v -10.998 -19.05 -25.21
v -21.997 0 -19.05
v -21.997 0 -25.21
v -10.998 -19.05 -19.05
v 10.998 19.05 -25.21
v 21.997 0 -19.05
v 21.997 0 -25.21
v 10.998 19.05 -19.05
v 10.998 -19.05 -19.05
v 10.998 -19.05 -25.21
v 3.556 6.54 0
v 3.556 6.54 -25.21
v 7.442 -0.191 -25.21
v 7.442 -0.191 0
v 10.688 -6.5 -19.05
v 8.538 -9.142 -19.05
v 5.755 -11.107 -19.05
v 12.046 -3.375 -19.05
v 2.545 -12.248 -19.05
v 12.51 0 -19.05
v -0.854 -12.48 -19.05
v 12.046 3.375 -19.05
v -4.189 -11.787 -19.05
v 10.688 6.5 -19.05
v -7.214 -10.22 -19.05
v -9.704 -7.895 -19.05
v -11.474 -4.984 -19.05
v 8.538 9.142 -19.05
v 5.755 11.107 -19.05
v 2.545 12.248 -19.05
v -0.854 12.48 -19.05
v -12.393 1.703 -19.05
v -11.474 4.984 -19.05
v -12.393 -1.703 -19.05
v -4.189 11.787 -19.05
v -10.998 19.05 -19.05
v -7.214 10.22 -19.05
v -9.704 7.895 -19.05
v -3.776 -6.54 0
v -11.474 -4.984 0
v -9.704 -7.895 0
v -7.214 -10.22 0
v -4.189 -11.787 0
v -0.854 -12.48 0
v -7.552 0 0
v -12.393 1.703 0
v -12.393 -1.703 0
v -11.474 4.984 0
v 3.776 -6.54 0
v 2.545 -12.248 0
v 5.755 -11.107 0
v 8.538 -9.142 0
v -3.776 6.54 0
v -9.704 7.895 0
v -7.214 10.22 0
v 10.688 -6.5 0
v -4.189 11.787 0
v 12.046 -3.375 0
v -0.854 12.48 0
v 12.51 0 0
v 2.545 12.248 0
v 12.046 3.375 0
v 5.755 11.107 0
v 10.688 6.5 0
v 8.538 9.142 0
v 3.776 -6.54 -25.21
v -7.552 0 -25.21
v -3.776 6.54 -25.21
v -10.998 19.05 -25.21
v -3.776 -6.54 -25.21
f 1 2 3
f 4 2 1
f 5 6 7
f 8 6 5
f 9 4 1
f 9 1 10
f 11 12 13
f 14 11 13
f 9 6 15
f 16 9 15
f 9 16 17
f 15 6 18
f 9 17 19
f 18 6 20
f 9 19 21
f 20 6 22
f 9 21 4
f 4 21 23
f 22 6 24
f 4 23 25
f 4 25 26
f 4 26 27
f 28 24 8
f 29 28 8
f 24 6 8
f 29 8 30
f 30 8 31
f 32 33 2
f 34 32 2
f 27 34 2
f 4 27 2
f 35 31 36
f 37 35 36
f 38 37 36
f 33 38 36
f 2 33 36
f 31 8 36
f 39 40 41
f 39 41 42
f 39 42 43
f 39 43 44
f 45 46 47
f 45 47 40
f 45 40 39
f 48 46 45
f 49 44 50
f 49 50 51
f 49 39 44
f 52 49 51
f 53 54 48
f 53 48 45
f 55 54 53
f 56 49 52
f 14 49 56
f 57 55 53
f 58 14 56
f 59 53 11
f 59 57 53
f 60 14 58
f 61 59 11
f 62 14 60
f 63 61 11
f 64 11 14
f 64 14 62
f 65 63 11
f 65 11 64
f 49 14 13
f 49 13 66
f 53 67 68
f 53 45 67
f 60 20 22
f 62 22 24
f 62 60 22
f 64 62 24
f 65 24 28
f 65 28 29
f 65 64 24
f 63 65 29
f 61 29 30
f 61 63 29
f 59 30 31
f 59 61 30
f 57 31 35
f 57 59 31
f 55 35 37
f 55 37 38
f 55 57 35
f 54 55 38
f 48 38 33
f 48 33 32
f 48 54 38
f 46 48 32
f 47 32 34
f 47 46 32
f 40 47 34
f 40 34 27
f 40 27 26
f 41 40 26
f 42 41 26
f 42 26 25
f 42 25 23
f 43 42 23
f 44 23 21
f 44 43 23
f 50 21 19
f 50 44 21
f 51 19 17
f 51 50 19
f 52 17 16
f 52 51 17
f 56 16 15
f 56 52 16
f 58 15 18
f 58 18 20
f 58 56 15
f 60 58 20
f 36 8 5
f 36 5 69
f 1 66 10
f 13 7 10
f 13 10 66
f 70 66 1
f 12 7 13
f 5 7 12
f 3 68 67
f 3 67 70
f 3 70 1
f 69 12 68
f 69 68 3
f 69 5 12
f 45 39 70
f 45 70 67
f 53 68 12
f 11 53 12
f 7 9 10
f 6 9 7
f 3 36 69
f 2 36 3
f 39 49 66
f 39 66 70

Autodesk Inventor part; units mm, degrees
ref_plane "YZ Plane" through (0, 0, 0) normal (1, 0, 0) x (0, 1, 0)
ref_plane "XZ Plane" through (0, 0, 0) normal (0, 1, 0) x (-1, 0, 0)
ref_plane "XY Plane" through (0, 0, 0) normal (0, 0, 1) x (1, 0, 0)
sketch "Sketch1" plane through (0, 0, 0) normal (0, 0, 1) x (1, 0, 0)
  line L0 (3.6662, 6.35) -> (7.3323, 0)
  line L1 (7.3323, 0) -> (3.6662, -6.35)
  line L2 (3.6662, -6.35) -> (-3.6662, -6.35)
  line L3 (-3.6662, -6.35) -> (-7.3323, 0)
  line L4 (-7.3323, 0) -> (-3.6662, 6.35)
  line L5 (-3.6662, 6.35) -> (3.6662, 6.35)
  circle A0 centre (0, 0) radius 12.7
  circle A1 centre (0, 0) radius 7.3323 construction
  dimension "d0" = 12.7
  dimension "d2" = 25.4
  dimension "d3" = 5.3677
extrude "Extrusion1" add sketch "Sketch1" against normal blind 19.05
sketch "Sketch2" plane through (0, 0, -19.05) normal (0, 0, -1) x (-1, 0, 0)
  line L0 (7.3323, 0) -> (3.6662, -6.35) projected
  line L1 (3.6662, -6.35) -> (-3.6662, -6.35)
  line L2 (-3.6662, -6.35) -> (-7.3323, 0)
  line L3 (-7.3323, 0) -> (-3.6662, 6.35)
  line L4 (-3.6662, 6.35) -> (3.6662, 6.35)
  line L5 (3.6662, 6.35) -> (7.3323, 0)
  line L6 (7.3323, 0) -> (3.6662, -6.35)
  line L7 (-10.9985, 19.05) -> (10.9985, 19.05)
  line L8 (10.9985, 19.05) -> (21.997, 0)
  line L9 (21.997, 0) -> (10.9985, -19.05)
  line L10 (10.9985, -19.05) -> (-10.9985, -19.05)
  line L11 (-10.9985, -19.05) -> (-21.997, 0)
  line L12 (-21.997, 0) -> (-10.9985, 19.05)
  point P0 (0, 0)
  point P1 (0, 0)
  point P2 (0, 0)
  dimension "d7" = 12.7
  dimension "d10" = 38.1
extrude "Extrusion3" add sketch "Sketch2" along normal blind 6.35
thicken "Thicken Internal Hex Hold" operation add thickness 0.1905 both sides no extend neighbours yes toward (0, 1, 0) faces at (1.2221, 6.35, -16.9333) (-4.8882, 4.2333, -16.9333) (1.2221, 14.8167, -25.4) (6.1103, -2.1167, -16.9333) (1.2221, -6.35, -16.9333) (-4.8882, -4.2333, -16.9333)
thicken "Reduce Size of Bushing Fitting" operation add thickness 0.1905 both sides no extend neighbours yes toward (-0.9870503, 0.1604113, 0) faces at (12.5355, -2.0372, -12.7)
equation "\"d13\" = printSpacing"
equation "\"d14\" = printSpacing"
equation "\"d15\" = printSpacing"
equation "\"d16\" = printSpacing"
equation "\"hexSize\" = 12.7"
equation "\"printSpacing\" = 0.1905"
properties part number "1_2x1-hexBushing" material "PC/ABS Plastic"
